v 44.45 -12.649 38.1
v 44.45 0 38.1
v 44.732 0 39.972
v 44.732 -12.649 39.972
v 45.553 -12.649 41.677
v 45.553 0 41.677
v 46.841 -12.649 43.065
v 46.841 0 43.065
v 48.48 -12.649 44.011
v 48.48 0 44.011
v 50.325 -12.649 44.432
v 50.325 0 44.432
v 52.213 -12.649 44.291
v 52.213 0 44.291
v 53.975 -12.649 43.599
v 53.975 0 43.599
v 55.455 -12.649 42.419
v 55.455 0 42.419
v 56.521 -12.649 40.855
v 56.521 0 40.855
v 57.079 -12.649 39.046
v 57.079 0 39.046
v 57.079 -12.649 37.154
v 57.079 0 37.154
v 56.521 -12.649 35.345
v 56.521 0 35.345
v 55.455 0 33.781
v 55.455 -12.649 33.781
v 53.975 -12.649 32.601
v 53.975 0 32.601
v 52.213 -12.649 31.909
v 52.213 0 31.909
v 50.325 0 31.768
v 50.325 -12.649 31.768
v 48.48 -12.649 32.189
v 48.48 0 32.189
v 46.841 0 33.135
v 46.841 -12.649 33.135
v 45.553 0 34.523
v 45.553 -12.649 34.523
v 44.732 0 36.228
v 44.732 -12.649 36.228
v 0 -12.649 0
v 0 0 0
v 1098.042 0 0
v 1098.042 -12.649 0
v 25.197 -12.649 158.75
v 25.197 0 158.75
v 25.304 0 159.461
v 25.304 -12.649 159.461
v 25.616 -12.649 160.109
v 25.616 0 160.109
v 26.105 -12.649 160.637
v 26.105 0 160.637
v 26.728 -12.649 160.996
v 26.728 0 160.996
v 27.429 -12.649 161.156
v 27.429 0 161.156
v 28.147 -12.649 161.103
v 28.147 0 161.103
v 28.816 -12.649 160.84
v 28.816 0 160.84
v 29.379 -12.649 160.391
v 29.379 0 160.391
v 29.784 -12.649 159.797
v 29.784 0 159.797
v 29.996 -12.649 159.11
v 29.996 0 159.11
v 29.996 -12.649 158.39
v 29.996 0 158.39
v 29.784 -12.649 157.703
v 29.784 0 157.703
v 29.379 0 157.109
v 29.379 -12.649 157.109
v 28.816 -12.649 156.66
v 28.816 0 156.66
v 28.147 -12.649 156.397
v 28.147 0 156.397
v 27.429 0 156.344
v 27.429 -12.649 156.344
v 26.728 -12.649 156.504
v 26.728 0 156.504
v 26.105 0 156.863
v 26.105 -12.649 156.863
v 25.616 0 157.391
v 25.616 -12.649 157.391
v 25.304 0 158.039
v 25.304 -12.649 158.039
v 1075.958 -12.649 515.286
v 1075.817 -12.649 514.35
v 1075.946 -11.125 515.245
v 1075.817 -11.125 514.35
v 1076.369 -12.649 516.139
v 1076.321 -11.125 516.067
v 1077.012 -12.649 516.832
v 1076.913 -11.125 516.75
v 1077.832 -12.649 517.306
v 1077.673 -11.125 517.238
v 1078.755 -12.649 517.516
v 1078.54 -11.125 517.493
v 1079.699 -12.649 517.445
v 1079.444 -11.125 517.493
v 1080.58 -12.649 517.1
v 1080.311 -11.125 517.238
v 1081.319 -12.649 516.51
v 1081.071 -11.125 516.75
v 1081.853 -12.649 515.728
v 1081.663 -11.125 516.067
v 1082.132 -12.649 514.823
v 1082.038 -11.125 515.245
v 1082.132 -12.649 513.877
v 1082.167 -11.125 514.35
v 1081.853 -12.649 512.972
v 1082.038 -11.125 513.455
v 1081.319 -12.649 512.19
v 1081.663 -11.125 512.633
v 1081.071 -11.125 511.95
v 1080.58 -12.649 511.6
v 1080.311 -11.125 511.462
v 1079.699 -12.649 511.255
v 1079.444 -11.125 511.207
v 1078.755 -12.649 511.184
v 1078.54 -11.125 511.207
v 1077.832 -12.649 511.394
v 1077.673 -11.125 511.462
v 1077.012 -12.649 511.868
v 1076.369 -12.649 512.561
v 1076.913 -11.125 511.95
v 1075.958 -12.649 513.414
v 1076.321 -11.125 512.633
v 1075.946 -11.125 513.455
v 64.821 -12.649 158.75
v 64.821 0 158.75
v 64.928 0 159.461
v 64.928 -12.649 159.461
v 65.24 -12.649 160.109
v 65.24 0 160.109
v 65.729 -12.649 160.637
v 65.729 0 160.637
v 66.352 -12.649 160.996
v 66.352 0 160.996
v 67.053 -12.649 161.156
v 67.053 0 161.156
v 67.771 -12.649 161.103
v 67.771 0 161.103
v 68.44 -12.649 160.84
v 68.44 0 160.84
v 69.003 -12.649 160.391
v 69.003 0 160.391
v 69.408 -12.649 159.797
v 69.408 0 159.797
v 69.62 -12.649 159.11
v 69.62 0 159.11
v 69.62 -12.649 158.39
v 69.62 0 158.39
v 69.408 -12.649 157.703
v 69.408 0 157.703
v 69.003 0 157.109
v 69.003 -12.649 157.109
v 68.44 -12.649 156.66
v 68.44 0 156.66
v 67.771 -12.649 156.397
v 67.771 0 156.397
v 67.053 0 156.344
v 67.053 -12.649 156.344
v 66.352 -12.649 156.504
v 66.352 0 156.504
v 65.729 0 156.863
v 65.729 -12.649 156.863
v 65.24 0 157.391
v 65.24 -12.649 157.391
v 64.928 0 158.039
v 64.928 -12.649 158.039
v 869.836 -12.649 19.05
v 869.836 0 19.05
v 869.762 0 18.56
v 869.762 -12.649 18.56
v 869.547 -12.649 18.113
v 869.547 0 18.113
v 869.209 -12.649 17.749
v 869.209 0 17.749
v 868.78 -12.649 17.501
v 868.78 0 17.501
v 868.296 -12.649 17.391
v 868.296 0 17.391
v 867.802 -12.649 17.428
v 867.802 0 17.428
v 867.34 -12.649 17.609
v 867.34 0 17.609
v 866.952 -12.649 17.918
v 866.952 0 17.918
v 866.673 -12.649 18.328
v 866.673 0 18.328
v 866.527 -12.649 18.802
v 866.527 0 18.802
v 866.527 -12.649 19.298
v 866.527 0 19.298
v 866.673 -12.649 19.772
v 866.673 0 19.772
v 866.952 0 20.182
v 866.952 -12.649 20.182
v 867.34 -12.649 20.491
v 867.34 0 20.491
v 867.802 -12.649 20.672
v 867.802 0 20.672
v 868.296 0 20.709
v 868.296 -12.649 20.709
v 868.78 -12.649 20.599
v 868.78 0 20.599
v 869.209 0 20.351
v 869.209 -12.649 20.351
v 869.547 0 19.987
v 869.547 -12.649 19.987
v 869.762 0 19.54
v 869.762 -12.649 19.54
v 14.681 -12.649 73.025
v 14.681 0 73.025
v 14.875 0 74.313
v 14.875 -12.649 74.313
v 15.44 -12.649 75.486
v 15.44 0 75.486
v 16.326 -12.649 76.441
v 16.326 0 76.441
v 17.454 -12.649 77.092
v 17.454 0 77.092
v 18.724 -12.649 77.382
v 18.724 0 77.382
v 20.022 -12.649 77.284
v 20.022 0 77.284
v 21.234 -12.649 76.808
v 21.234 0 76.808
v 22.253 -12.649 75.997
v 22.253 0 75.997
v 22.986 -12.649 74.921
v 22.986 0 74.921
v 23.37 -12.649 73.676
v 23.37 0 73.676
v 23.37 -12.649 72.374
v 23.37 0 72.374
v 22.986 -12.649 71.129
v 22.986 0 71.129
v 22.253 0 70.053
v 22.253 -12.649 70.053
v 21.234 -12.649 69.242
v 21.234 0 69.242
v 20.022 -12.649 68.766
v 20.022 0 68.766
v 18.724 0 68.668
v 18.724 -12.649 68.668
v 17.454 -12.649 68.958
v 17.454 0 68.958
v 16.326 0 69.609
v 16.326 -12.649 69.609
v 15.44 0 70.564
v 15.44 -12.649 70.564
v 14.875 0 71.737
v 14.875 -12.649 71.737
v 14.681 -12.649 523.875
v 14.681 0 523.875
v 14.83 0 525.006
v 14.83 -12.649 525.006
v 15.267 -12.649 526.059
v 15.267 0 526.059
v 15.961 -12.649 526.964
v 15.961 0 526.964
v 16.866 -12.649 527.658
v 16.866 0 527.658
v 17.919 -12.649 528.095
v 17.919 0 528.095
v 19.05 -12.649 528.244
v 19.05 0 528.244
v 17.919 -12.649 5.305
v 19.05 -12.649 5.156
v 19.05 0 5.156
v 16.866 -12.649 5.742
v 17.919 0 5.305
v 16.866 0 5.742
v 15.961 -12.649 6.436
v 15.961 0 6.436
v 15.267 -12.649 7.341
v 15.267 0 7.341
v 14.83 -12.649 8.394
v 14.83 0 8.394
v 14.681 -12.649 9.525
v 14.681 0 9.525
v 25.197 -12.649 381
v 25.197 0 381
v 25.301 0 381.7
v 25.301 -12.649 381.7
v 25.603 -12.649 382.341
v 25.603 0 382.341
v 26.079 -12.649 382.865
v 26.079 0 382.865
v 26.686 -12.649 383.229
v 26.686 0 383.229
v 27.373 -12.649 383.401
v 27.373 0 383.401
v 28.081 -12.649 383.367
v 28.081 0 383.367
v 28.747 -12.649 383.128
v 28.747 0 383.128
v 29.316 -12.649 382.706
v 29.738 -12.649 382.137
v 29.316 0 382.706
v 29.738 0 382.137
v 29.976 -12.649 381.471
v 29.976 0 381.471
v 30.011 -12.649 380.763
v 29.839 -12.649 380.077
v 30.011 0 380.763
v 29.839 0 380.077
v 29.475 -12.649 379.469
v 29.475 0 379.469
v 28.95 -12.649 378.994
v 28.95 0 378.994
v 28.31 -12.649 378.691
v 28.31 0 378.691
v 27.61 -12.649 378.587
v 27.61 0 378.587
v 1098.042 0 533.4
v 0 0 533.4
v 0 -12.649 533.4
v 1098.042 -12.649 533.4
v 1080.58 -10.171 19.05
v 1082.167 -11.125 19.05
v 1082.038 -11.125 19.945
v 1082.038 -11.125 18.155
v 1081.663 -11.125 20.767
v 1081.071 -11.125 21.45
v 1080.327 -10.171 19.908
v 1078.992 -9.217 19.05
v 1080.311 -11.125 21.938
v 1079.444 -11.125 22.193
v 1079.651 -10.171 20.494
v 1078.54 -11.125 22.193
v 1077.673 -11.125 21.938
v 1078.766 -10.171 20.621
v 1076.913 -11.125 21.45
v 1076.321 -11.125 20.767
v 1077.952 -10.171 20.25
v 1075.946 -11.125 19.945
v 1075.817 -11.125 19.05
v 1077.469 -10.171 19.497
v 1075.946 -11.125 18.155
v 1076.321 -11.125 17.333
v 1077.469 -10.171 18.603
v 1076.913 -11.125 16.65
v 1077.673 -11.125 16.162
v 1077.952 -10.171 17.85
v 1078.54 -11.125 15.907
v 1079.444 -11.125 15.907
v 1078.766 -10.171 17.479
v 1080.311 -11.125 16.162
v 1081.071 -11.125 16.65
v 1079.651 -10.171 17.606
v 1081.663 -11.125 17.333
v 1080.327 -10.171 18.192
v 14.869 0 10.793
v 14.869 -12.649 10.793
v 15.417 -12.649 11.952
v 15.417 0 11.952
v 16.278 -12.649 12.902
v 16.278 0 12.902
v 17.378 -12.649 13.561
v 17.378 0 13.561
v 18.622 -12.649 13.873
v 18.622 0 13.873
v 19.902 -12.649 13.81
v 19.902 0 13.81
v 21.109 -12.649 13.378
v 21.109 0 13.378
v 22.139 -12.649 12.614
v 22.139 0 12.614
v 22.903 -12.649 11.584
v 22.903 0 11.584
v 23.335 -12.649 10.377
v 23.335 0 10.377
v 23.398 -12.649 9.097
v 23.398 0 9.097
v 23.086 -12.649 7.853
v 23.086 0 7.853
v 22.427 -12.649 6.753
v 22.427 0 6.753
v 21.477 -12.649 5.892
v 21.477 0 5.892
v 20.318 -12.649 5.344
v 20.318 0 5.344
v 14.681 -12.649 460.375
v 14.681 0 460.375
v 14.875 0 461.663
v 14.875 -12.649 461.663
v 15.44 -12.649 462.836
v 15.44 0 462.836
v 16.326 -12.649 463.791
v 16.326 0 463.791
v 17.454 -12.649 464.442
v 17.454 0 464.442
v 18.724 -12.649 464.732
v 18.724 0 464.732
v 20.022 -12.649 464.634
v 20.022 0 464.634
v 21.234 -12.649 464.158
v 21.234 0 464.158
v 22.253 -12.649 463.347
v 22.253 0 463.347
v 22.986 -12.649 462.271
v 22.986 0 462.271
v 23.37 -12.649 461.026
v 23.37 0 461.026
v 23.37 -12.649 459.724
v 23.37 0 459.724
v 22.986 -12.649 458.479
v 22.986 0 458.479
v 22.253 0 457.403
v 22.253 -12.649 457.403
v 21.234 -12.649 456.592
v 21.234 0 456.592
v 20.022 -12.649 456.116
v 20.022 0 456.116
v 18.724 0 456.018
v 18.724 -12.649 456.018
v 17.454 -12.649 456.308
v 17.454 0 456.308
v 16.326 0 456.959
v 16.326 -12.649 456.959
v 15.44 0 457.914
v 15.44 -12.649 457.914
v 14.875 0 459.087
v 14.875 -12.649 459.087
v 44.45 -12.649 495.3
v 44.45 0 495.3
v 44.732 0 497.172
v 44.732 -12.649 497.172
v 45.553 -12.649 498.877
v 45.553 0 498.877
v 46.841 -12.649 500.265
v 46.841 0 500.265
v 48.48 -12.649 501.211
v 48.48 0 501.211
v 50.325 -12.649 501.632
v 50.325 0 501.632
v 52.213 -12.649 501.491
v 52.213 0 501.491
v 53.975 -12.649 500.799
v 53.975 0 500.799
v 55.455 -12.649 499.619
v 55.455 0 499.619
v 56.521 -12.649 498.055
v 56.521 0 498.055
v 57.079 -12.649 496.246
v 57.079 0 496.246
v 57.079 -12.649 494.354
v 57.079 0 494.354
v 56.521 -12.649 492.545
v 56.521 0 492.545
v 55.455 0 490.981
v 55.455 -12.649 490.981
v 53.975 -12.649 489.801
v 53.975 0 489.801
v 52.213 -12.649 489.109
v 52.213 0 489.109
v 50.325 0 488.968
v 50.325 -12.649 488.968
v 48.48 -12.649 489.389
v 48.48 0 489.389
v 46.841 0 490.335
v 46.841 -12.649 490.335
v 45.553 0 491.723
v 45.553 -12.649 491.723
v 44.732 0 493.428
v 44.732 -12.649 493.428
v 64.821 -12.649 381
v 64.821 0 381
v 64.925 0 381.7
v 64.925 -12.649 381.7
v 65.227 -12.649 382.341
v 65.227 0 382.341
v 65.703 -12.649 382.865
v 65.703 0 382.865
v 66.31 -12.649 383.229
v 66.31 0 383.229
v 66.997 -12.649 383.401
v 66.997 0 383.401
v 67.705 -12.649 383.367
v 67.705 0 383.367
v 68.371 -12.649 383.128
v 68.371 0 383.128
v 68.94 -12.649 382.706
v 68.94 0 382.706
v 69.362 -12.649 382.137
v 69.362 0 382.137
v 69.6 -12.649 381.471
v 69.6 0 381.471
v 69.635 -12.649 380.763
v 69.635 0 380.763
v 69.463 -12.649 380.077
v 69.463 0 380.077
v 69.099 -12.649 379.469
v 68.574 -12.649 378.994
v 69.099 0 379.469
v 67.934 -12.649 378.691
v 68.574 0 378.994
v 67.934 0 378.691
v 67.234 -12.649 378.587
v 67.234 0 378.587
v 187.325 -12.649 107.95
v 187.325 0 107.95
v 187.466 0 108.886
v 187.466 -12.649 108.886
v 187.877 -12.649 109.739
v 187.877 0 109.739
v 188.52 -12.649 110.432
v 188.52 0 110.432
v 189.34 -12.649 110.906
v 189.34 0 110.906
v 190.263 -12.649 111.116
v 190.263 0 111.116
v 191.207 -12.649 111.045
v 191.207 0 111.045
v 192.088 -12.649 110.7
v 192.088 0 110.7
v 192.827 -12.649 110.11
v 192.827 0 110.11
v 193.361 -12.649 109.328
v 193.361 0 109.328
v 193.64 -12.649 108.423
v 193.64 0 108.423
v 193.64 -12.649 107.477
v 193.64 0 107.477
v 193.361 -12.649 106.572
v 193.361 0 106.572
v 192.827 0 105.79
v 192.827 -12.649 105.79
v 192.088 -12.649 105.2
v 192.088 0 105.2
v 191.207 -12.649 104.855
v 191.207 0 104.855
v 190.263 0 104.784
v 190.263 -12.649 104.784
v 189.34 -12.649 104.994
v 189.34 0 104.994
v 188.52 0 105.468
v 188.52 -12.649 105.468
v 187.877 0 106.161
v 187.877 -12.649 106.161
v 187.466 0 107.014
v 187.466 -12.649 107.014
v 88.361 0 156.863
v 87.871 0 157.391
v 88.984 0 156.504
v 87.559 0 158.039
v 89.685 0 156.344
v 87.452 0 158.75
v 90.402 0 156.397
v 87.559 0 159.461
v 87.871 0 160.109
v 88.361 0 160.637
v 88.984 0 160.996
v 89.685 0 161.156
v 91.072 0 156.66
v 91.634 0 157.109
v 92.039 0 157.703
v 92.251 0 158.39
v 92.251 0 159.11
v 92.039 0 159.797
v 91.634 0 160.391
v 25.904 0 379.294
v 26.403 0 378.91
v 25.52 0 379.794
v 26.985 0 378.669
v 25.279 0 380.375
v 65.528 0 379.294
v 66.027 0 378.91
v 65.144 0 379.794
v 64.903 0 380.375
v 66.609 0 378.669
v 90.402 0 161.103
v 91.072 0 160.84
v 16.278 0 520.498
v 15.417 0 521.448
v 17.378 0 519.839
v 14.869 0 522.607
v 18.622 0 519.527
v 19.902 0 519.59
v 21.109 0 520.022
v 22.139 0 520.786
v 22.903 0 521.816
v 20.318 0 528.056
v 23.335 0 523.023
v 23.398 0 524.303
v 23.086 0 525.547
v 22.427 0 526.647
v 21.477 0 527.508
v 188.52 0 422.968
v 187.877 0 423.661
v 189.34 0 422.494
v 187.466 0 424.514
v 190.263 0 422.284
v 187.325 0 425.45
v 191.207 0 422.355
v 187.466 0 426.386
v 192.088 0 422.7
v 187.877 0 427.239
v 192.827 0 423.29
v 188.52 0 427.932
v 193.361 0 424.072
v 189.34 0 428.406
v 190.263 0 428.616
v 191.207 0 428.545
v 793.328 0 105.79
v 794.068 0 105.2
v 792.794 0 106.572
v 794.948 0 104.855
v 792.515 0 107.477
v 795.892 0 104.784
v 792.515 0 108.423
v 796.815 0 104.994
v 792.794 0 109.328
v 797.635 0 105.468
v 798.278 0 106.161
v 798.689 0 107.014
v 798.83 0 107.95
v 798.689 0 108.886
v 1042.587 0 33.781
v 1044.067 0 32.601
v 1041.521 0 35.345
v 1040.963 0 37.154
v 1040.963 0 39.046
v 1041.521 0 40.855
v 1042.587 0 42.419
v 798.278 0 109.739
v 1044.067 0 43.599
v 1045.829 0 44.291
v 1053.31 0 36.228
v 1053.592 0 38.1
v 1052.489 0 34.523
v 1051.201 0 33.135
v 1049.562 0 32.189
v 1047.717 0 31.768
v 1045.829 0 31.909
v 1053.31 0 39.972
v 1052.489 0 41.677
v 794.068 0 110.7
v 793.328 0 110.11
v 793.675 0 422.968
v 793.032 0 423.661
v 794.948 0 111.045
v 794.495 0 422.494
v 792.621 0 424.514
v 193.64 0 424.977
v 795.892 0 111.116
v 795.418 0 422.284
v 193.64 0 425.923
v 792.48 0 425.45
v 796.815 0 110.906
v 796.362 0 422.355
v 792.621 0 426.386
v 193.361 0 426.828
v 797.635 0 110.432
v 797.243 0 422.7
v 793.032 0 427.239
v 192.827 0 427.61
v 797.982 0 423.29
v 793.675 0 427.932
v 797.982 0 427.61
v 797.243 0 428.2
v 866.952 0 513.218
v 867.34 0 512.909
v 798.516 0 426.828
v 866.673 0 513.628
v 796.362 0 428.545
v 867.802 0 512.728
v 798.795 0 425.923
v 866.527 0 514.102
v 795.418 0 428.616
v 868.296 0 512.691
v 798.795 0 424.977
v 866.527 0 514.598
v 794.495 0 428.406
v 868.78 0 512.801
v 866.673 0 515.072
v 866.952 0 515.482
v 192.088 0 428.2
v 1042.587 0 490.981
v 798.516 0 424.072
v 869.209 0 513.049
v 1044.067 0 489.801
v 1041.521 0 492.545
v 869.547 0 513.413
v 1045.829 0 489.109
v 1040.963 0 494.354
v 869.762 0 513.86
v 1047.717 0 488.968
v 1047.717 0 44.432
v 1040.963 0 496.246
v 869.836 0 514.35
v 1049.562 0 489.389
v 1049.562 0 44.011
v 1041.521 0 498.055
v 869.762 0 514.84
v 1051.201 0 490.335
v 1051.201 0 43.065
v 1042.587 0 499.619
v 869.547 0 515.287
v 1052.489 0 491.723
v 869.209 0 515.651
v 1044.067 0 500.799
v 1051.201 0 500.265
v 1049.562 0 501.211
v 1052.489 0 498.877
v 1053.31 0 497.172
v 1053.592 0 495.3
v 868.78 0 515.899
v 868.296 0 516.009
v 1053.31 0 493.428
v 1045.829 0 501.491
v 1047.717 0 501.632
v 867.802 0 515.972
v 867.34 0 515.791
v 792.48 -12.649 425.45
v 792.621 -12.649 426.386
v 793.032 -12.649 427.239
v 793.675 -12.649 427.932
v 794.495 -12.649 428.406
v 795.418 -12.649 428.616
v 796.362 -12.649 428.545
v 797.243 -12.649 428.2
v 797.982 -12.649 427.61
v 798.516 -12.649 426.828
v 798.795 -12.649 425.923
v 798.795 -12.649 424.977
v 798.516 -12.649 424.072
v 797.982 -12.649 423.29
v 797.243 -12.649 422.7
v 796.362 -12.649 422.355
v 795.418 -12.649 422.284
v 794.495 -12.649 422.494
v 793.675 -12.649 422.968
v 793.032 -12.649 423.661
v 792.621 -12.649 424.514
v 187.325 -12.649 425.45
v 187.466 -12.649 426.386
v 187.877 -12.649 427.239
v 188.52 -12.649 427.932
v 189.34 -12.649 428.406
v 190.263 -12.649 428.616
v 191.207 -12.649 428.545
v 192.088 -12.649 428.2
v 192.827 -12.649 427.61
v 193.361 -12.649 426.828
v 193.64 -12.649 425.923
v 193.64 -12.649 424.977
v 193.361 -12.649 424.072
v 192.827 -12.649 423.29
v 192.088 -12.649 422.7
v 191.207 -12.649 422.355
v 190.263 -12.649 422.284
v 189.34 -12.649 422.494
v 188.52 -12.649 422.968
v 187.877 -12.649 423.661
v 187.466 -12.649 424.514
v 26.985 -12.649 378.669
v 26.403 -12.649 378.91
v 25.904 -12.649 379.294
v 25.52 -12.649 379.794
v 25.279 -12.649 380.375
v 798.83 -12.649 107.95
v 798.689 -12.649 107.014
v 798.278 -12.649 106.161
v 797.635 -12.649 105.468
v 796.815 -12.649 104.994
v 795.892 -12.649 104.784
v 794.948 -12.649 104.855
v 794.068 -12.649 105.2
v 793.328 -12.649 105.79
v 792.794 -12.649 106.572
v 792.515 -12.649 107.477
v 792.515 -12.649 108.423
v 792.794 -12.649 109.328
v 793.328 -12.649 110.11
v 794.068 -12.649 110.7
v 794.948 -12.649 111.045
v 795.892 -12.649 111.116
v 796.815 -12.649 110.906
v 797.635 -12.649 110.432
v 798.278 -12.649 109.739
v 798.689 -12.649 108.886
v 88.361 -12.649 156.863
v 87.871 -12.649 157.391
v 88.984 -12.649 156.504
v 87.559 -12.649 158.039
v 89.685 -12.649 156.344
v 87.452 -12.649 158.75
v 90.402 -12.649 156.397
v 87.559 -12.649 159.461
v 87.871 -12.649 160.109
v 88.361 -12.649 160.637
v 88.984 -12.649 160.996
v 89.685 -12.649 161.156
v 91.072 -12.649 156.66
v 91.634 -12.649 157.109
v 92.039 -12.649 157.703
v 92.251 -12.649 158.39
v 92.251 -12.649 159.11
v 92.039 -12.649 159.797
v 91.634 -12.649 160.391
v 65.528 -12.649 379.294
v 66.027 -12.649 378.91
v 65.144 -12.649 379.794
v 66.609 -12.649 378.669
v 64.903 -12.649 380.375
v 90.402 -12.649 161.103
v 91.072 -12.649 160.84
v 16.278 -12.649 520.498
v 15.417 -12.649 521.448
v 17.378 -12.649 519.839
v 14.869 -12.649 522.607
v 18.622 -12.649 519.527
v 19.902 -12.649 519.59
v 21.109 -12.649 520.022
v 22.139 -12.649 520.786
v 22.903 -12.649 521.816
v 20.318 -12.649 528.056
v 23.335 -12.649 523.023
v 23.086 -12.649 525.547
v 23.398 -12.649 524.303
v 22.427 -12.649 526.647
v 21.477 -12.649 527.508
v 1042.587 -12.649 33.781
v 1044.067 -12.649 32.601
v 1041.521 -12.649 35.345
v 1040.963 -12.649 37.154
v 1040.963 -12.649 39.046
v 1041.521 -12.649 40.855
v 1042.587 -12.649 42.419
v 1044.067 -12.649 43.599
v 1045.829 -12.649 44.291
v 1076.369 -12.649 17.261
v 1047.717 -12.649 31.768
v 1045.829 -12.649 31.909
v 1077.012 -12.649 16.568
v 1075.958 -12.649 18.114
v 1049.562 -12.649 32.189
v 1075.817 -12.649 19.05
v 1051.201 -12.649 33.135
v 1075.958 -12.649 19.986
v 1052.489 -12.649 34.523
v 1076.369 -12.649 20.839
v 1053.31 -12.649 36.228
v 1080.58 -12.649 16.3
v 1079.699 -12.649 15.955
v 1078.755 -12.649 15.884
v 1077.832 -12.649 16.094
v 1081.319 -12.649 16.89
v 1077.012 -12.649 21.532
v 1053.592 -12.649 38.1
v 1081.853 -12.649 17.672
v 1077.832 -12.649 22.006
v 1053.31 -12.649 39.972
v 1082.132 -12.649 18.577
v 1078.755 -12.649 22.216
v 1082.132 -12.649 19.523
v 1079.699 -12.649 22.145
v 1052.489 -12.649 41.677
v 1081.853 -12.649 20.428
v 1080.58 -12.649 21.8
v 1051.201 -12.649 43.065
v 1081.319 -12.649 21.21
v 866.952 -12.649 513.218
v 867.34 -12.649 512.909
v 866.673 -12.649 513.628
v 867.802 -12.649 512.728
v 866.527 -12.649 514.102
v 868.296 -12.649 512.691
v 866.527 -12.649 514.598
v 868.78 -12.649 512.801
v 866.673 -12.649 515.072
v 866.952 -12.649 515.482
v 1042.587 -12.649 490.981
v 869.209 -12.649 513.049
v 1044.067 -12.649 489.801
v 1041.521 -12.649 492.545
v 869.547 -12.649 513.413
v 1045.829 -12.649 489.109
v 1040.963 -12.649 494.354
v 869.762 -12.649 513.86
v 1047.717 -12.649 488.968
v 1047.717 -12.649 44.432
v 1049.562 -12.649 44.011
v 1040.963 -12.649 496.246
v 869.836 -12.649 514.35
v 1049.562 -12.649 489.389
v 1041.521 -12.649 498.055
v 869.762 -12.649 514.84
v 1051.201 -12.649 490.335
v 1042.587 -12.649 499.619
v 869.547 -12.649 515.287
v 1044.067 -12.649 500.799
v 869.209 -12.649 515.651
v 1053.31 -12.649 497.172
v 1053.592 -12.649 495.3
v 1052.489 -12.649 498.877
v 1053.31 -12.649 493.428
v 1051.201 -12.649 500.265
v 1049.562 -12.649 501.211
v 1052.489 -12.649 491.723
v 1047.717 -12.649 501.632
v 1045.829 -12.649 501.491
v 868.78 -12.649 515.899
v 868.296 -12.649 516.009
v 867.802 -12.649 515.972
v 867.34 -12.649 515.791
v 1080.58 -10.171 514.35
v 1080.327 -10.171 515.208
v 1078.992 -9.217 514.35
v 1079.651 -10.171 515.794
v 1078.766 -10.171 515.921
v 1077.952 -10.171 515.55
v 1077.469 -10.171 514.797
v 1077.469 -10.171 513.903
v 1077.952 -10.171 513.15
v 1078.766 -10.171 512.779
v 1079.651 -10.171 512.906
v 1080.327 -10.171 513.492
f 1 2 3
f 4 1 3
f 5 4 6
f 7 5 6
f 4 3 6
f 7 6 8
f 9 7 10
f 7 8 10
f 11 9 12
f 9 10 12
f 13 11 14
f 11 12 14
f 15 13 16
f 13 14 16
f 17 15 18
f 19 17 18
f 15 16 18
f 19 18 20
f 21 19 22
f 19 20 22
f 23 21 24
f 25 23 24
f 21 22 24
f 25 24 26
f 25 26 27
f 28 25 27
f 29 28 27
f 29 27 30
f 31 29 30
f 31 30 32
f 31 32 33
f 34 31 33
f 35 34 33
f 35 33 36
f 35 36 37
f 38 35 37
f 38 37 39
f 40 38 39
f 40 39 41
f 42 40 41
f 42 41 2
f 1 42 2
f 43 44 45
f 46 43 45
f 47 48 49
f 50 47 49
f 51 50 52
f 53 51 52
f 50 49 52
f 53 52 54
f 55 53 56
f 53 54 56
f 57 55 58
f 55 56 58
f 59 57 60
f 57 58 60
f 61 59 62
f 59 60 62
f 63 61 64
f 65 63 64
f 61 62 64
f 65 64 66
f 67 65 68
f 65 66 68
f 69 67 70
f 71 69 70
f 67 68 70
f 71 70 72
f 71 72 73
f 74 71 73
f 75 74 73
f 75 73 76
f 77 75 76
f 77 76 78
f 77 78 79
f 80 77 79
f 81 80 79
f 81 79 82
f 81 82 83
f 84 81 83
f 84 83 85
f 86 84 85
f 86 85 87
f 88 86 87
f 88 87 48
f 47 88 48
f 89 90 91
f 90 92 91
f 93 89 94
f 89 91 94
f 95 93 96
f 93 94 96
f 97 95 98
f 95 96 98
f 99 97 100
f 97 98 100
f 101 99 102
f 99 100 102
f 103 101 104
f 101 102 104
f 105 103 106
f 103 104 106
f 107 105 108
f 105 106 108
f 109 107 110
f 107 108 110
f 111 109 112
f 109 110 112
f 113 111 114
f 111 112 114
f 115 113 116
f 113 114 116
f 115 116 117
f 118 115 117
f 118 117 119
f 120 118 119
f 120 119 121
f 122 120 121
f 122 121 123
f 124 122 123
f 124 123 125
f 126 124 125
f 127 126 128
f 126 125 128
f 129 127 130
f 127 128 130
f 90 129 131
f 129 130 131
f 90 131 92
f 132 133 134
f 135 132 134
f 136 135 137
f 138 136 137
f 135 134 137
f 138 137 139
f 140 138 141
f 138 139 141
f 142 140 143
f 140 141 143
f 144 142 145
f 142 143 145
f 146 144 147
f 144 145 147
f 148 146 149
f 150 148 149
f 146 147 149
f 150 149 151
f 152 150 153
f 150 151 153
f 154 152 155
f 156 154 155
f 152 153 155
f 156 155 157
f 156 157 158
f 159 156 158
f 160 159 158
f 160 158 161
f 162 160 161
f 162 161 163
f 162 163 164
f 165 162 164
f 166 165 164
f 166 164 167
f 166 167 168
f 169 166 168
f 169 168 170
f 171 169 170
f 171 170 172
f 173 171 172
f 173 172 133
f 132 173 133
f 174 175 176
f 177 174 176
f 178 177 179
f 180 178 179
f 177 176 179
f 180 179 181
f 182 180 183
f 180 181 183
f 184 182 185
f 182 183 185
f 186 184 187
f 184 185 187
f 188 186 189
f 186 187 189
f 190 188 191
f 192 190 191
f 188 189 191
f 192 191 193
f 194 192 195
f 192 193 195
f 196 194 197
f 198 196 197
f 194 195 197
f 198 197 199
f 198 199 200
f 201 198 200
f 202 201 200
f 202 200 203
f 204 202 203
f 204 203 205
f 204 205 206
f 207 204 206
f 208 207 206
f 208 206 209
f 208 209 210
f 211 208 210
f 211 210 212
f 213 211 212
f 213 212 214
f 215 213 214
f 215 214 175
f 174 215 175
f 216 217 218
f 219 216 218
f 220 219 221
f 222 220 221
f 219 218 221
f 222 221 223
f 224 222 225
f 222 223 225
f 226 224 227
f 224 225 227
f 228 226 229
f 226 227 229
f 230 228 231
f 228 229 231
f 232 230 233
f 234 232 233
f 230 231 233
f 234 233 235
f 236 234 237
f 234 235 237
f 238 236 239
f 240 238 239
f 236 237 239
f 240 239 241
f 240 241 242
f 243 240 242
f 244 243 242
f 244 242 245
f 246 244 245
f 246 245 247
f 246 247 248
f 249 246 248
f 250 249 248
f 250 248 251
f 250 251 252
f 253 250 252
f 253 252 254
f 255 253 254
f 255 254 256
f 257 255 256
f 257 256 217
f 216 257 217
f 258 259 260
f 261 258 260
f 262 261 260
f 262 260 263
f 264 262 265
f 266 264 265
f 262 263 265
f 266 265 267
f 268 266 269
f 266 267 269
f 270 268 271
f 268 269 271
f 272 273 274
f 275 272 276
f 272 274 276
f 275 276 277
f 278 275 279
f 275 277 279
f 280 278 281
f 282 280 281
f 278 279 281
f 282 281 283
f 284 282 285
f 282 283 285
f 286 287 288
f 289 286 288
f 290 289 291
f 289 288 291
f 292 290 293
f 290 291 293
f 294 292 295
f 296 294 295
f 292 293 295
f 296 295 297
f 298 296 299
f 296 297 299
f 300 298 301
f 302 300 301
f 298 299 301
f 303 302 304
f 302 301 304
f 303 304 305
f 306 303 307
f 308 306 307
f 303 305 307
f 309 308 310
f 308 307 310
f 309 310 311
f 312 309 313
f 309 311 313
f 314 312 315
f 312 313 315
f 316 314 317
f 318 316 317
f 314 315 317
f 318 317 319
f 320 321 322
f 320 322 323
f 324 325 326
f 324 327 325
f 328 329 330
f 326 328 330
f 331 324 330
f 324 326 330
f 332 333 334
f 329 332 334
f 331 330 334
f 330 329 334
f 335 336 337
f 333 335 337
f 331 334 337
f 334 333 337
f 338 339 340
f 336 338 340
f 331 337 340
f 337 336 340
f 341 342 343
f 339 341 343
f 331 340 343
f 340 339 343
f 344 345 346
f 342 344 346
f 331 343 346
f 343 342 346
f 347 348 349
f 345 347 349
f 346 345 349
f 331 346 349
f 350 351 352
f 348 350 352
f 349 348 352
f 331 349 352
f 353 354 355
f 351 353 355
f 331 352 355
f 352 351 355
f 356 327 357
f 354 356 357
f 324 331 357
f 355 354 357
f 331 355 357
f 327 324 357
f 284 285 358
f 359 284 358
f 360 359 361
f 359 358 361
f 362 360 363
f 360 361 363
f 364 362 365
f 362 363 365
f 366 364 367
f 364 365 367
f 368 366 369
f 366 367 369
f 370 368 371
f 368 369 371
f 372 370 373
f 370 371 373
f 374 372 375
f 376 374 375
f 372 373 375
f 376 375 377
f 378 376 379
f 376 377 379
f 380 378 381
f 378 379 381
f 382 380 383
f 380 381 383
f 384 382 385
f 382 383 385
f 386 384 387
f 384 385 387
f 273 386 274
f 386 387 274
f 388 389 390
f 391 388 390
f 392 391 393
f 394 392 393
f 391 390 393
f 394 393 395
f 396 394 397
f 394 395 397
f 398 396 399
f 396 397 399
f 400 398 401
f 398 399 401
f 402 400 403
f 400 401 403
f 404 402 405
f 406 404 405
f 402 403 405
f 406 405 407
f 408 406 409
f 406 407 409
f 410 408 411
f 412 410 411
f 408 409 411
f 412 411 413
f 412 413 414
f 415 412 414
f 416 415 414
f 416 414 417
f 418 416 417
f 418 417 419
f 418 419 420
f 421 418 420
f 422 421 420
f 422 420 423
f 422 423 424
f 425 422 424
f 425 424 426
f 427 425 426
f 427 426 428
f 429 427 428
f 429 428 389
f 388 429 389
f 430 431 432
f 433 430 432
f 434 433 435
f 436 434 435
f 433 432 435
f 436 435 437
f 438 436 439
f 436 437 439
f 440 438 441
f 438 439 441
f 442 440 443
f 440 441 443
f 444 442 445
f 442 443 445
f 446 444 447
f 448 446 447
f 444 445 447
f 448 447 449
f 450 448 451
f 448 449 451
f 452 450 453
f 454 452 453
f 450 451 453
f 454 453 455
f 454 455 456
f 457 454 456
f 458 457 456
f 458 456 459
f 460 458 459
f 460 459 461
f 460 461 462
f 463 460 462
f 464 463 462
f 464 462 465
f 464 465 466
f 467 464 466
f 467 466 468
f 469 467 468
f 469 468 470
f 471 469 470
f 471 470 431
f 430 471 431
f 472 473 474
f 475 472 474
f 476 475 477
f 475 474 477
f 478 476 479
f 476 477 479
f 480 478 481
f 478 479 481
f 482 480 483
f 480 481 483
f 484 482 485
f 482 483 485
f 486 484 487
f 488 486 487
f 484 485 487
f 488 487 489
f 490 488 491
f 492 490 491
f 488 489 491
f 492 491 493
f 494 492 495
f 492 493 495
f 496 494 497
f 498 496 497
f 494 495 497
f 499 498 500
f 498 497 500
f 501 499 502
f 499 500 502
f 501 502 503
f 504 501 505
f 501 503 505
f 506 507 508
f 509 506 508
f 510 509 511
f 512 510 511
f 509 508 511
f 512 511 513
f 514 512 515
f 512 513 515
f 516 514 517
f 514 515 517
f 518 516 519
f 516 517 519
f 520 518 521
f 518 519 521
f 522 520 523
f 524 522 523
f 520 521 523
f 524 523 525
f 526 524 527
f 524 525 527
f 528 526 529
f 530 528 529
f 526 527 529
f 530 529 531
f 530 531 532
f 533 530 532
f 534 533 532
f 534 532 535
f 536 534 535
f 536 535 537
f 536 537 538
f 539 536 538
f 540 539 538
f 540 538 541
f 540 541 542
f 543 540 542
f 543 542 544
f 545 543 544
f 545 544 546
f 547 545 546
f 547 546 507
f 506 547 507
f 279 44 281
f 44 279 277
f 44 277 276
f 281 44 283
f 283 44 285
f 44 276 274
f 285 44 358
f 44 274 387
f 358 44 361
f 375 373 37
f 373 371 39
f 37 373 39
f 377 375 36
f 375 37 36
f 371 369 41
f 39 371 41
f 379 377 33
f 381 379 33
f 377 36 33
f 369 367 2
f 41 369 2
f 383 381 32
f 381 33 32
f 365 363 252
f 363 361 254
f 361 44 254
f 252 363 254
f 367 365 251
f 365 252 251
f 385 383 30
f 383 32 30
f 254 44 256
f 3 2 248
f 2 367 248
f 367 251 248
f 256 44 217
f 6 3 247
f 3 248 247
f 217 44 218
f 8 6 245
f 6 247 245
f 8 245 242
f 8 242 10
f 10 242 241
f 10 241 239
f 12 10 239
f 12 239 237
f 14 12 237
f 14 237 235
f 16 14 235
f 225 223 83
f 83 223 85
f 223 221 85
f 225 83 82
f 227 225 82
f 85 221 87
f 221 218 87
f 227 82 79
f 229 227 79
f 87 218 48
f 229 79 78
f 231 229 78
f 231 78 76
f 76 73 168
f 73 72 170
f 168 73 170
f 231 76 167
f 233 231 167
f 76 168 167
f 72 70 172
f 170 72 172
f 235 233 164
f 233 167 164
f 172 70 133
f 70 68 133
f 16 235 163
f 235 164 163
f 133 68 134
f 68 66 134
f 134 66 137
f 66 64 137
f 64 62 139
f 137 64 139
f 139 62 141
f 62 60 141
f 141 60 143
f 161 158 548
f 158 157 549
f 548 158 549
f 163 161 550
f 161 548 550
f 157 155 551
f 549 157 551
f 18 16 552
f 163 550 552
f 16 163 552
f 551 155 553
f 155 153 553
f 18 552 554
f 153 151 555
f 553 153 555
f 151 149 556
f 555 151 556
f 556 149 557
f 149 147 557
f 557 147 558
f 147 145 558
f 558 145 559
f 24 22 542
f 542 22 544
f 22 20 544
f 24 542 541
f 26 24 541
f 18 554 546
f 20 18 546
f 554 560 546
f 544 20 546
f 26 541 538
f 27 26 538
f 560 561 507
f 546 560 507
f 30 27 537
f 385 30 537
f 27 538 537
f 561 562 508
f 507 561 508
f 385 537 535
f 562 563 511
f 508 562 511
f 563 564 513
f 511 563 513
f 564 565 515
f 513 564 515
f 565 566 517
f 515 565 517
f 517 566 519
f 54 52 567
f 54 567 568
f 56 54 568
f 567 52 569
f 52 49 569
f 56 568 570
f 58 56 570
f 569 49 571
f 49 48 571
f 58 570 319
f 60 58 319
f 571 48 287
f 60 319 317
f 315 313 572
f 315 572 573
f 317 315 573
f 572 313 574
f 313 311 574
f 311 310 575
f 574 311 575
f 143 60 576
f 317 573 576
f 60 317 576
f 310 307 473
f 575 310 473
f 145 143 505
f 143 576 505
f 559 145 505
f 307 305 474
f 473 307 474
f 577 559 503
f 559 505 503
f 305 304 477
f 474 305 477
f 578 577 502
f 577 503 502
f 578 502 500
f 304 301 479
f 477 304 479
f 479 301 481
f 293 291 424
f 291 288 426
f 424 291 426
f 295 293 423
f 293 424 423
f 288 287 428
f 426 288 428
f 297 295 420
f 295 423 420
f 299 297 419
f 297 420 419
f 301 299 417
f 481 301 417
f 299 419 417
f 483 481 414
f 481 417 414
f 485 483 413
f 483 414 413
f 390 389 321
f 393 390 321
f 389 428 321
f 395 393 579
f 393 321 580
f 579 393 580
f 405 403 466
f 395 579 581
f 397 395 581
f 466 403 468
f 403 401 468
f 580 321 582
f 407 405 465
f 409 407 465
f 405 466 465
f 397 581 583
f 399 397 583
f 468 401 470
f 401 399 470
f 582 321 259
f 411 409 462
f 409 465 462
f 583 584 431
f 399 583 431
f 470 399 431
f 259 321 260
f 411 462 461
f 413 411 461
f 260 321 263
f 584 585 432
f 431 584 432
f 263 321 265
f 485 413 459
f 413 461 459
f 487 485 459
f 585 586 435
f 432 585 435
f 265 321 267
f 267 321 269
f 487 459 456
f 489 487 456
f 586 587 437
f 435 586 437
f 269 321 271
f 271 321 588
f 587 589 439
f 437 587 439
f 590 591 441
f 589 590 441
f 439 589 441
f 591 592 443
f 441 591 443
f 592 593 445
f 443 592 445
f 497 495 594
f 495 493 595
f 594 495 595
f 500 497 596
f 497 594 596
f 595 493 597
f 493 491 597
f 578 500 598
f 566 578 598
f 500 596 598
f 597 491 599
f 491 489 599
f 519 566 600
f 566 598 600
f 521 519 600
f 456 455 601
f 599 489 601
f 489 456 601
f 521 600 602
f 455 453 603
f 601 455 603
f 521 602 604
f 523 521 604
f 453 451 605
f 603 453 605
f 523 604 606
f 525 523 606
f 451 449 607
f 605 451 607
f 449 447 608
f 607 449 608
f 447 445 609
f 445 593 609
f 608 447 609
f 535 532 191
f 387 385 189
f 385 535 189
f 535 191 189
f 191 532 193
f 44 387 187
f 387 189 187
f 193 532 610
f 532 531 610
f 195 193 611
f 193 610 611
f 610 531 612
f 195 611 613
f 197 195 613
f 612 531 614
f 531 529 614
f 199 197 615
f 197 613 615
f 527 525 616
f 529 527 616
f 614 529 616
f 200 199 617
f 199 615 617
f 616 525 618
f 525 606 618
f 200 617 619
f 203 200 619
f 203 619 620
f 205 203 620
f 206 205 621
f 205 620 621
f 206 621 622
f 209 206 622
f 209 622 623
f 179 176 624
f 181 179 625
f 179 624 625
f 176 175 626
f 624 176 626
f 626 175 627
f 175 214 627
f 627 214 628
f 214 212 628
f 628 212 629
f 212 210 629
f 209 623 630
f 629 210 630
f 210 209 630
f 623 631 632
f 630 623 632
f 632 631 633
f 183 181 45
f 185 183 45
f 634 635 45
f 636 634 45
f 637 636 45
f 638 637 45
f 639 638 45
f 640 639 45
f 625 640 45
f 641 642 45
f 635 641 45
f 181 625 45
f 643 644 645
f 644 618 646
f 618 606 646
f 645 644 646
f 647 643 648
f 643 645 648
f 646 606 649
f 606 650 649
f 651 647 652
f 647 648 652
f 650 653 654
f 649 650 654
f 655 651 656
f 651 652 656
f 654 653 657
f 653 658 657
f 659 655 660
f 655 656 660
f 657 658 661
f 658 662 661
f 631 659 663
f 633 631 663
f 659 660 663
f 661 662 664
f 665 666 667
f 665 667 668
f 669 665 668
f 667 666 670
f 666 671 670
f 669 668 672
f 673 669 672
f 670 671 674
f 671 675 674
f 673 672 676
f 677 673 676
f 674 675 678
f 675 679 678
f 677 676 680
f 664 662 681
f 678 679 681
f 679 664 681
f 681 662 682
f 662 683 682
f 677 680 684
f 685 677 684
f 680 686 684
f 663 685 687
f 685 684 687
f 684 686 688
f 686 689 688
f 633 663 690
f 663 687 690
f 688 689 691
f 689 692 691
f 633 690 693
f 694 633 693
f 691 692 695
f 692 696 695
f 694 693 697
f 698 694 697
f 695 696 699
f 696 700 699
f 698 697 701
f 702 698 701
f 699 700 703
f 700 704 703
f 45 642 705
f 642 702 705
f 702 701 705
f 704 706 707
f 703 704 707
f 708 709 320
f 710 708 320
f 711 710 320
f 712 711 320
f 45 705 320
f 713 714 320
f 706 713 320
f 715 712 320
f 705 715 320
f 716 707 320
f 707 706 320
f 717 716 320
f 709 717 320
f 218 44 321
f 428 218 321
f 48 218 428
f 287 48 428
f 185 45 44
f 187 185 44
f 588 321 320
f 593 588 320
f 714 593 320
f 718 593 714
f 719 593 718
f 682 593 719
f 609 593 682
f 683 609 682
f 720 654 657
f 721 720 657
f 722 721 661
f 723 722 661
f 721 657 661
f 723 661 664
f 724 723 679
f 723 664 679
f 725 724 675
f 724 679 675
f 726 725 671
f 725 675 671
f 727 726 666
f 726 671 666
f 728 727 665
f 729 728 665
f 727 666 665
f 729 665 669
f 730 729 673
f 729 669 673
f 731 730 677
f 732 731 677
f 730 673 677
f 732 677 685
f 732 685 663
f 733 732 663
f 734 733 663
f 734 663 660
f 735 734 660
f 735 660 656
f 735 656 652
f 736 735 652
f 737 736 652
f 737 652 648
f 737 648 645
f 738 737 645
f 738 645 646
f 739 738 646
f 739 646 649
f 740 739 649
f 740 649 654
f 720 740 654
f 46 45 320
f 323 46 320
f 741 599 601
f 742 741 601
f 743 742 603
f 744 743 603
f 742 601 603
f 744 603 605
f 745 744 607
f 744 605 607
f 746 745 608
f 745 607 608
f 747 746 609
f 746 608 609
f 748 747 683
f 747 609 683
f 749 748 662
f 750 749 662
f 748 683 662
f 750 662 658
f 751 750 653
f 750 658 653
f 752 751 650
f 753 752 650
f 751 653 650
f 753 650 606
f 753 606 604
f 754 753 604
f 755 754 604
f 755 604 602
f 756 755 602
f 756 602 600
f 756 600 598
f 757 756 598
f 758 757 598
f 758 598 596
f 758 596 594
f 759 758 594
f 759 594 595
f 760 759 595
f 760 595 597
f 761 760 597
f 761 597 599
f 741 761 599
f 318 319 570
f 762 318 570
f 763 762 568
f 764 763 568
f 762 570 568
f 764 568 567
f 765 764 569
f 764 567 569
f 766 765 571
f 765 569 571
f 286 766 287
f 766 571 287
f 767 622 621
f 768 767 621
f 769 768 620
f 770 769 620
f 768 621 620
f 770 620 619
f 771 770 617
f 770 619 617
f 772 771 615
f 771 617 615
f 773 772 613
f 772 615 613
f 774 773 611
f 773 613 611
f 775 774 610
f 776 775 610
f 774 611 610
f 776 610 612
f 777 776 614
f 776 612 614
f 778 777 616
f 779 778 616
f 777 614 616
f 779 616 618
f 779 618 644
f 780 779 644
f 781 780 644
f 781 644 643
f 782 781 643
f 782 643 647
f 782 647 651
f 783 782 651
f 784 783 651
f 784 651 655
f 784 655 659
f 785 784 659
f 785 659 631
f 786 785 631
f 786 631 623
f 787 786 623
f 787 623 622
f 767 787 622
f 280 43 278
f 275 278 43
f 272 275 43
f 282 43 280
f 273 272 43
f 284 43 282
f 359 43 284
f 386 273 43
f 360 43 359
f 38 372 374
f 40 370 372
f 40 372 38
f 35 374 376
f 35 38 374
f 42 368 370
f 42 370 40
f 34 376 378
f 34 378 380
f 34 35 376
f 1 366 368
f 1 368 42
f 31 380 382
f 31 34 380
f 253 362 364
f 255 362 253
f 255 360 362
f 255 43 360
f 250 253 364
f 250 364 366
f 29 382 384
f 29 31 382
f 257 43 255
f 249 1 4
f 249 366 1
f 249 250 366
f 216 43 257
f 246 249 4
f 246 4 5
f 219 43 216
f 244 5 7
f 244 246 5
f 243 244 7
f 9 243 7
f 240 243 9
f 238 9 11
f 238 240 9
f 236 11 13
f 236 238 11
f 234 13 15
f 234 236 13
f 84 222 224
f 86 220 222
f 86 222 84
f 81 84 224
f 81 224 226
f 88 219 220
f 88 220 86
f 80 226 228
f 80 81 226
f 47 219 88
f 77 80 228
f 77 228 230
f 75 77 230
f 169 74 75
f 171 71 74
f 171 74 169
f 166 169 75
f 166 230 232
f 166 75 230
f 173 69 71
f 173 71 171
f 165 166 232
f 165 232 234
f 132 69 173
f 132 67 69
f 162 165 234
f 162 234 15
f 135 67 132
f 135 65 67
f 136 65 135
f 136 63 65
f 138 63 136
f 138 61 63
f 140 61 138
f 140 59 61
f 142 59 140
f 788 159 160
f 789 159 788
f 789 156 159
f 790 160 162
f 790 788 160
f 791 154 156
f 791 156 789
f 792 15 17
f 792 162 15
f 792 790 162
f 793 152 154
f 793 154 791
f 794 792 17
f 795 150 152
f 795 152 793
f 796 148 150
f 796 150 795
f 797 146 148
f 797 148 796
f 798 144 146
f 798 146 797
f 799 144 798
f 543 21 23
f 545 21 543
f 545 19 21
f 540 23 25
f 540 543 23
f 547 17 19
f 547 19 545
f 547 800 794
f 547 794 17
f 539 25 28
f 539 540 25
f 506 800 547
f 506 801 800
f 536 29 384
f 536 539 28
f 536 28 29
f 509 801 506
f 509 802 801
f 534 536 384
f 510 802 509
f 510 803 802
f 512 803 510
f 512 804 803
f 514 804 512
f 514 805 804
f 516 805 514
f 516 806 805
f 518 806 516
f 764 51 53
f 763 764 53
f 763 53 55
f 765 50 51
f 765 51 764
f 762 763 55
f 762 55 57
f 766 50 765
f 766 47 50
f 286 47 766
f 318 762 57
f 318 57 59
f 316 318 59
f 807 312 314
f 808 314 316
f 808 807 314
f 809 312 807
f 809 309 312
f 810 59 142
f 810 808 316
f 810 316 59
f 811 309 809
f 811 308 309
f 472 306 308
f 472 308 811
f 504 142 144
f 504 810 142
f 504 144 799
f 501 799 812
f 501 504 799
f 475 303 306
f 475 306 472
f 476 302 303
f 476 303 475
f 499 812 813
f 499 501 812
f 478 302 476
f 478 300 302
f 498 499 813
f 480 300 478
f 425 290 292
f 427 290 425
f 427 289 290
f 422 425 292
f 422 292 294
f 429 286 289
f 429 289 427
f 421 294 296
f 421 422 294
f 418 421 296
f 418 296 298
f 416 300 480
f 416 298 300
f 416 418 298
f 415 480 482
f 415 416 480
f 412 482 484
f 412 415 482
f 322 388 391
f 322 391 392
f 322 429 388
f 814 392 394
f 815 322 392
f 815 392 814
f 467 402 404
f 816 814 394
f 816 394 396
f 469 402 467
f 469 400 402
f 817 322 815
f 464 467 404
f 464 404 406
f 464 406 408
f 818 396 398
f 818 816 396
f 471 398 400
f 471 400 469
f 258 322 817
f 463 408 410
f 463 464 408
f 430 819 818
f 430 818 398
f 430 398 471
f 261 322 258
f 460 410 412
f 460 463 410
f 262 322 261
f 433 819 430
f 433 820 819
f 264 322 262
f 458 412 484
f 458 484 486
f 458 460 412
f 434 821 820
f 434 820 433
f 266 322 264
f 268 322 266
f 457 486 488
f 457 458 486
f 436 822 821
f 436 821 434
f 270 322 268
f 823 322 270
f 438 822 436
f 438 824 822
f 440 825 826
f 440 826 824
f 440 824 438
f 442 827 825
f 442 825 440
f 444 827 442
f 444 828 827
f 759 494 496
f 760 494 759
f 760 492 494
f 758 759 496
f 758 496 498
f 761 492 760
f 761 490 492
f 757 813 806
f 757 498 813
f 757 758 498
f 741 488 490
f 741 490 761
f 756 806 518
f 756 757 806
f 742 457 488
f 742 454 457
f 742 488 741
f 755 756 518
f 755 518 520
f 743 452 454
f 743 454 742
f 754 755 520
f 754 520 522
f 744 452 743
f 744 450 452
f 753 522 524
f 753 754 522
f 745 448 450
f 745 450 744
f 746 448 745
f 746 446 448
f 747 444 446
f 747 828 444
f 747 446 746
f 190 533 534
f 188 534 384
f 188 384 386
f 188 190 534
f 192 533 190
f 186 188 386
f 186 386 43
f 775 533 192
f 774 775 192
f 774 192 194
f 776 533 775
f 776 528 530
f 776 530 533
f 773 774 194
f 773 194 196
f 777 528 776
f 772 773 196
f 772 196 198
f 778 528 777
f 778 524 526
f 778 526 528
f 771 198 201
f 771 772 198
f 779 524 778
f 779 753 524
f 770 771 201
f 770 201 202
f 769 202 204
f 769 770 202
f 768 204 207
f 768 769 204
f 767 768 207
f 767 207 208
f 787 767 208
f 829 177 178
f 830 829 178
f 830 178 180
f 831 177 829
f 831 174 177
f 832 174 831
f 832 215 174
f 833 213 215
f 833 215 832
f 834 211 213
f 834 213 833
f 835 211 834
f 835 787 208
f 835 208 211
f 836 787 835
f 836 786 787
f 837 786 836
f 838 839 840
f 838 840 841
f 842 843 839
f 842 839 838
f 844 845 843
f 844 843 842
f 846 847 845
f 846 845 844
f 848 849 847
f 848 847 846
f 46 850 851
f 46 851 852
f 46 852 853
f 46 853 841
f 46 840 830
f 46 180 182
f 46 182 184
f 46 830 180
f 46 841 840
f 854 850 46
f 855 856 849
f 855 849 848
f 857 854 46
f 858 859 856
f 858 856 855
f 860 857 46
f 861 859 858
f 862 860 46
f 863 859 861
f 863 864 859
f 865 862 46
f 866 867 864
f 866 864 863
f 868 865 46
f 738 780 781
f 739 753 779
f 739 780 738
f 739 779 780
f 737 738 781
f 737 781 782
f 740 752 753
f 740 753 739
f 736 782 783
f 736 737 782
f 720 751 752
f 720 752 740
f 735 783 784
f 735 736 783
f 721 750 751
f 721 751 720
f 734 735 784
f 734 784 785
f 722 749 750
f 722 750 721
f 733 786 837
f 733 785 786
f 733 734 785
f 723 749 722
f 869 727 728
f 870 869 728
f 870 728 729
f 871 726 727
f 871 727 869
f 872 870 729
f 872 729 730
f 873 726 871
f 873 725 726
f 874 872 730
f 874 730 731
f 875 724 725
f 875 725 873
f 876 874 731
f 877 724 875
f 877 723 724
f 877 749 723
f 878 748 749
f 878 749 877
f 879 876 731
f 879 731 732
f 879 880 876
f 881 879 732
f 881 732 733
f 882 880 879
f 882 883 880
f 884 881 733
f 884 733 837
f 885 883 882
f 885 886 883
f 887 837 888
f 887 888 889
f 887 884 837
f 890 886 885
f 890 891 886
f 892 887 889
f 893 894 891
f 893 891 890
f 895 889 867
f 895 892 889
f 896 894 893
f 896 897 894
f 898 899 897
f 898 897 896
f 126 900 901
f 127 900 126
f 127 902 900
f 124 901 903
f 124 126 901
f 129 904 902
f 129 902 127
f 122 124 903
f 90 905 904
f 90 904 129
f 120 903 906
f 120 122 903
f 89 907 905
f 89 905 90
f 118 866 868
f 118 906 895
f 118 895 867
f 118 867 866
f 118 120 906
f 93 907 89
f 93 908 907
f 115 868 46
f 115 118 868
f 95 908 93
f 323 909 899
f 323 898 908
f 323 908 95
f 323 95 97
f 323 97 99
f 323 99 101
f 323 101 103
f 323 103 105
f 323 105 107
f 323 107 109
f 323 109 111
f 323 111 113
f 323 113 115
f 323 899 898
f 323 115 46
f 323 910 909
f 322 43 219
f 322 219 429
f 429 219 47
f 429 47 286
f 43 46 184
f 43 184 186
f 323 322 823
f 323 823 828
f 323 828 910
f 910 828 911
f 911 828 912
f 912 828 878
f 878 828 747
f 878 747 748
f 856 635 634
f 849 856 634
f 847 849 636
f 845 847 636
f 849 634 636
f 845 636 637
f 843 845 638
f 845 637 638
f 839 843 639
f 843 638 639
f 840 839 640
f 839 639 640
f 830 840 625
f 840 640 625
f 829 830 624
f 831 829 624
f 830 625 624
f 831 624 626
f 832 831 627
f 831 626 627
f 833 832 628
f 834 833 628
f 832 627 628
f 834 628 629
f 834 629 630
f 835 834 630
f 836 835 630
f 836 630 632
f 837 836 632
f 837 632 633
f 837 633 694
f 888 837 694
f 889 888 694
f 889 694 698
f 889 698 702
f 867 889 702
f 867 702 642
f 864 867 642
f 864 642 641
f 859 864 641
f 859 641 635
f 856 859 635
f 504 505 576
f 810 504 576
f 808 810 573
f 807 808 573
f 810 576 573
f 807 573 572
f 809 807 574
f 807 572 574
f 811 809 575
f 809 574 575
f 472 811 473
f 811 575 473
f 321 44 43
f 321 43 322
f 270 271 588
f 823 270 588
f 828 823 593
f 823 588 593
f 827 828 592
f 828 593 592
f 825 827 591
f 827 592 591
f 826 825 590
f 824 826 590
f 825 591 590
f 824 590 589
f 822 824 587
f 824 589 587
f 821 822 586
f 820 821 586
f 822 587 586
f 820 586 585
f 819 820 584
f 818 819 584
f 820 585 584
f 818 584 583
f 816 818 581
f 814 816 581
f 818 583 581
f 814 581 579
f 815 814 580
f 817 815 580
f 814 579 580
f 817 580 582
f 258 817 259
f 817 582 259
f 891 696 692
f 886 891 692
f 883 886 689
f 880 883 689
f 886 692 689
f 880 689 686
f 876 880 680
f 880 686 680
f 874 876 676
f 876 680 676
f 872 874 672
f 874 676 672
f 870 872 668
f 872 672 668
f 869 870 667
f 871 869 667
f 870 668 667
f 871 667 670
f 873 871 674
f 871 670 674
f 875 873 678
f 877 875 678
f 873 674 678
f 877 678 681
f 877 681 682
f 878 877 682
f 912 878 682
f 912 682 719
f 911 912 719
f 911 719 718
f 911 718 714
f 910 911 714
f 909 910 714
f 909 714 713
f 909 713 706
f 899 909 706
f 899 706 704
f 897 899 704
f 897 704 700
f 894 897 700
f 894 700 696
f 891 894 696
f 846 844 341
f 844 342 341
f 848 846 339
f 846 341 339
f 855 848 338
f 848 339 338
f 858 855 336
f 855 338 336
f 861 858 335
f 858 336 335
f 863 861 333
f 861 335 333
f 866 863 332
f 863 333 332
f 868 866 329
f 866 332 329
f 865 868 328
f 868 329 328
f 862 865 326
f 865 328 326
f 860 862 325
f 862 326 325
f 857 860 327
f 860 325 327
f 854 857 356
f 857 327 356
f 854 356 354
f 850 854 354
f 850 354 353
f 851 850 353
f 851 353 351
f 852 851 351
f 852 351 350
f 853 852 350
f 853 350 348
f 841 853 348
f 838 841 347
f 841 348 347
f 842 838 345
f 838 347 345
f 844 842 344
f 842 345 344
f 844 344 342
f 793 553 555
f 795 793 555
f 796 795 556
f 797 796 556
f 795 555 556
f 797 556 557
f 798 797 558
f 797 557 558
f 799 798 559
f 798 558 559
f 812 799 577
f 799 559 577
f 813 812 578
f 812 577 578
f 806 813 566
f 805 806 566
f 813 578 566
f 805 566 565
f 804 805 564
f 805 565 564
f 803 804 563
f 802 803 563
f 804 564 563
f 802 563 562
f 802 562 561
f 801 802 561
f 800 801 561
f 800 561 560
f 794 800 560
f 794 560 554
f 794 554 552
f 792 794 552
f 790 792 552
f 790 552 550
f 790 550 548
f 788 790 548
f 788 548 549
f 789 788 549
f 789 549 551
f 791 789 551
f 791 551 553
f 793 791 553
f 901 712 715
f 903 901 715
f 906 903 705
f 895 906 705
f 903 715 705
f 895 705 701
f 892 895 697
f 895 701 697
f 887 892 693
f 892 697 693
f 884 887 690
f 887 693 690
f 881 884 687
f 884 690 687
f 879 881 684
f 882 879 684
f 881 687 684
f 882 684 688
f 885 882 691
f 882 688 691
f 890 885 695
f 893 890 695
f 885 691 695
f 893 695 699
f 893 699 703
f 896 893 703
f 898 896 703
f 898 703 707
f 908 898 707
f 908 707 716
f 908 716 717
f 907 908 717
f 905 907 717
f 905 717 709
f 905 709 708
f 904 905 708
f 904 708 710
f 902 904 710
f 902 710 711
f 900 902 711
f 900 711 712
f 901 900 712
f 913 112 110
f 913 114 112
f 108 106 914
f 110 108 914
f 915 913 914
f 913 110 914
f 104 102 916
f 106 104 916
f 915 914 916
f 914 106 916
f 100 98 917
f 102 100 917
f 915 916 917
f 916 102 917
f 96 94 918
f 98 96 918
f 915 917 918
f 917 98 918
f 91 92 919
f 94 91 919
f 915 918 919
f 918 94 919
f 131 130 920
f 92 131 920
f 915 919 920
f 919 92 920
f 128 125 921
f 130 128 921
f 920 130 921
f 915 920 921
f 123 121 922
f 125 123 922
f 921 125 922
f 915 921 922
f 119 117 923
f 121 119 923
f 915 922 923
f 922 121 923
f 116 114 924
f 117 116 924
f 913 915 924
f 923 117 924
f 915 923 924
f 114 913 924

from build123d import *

# Parameters (mm, degrees)
F0_W     = 1098.042
F0_H     = 533.4
F1_DEPTH = 12.6492
F3_D     = 6.35
F3_DEPTH = 1.524
F3_TIP   = 1.9077324654
F4_R     = 6.35
F4_R_2   = 3.175
F4_R_3   = 2.413
F4_R_4   = 4.3688
F5_DEPTH = 25.4


with BuildPart() as f1:
    # F0 (on Front) → F1 (new body)
    with BuildSketch(Plane.XZ):
        with Locations((549.021, 266.7)):
            Rectangle(F0_W, F0_H)
    extrude(amount=F1_DEPTH)

    # F3
    with Locations(Plane.XZ.offset(12.6492)):
        with Locations((1078.992, 514.35), (1078.992, 19.05)):
            Hole(F3_D / 2, depth=F3_DEPTH)
            with Locations((0, 0, -(F3_DEPTH + F3_TIP / 2))):  # 118° drill point
                Cone(0, F3_D / 2, F3_TIP, mode=Mode.SUBTRACT)

    # F4 (on face) → F5 (cut)
    with BuildSketch(Plane(origin=(0, 0, 0), x_dir=(-1, 0, 0), z_dir=(0, 1, 0))):
        with BuildLine():
            ThreePointArc((-866.5083, 19.05), (-868.172, 20.7137), (-869.8357, 19.05))
            ThreePointArc((-869.8357, 19.05), (-868.172, 17.3863), (-866.5083, 19.05))
        make_face()
        with BuildLine():
            ThreePointArc((-792.48, 107.95), (-795.655, 111.125), (-798.83, 107.95))
            ThreePointArc((-798.83, 107.95), (-795.655, 104.775), (-792.48, 107.95))
        make_face()
        with BuildLine():
            ThreePointArc((-1040.892, 38.1), (-1047.242, 44.45), (-1053.592, 38.1))
            ThreePointArc((-1053.592, 38.1), (-1047.242, 31.75), (-1040.892, 38.1))
        make_face()
        with BuildLine():
            ThreePointArc((-866.5083, 514.35), (-868.172, 516.0137), (-869.8357, 514.35))
            ThreePointArc((-869.8357, 514.35), (-868.172, 512.6863), (-866.5083, 514.35))
        make_face()
        with BuildLine():
            ThreePointArc((-1040.892, 495.3), (-1047.242, 501.65), (-1053.592, 495.3))
            ThreePointArc((-1053.592, 495.3), (-1047.242, 488.95), (-1040.892, 495.3))
        make_face()
        with BuildLine():
            ThreePointArc((-798.83, 425.45), (-795.655, 422.275), (-792.48, 425.45))
            ThreePointArc((-792.48, 425.45), (-795.655, 428.625), (-798.83, 425.45))
        make_face()
        with Locations((-50.8, 38.1)):
            Circle(F4_R)
        with Locations((-190.5, 107.95)):
            Circle(F4_R_2)
        with Locations((-89.8652, 158.75)):
            Circle(F4_R_3)
        with BuildLine():
            ThreePointArc((-69.6468, 158.75), (-67.2338, 156.337), (-64.8208, 158.75))
            Line((-64.8208, 158.75), (-67.2338, 158.75))
            Line((-67.2338, 158.75), (-69.6468, 158.75))
        make_face()
        with BuildLine():
            Line((-67.2338, 158.75), (-64.8208, 158.75))
            ThreePointArc((-64.8208, 158.75), (-67.2338, 161.163), (-69.6468, 158.75))
            Line((-69.6468, 158.75), (-67.2338, 158.75))
        make_face()
        with BuildLine():
            ThreePointArc((-30.0228, 158.75), (-27.6098, 156.337), (-25.1968, 158.75))
            Line((-25.1968, 158.75), (-27.6098, 158.75))
            Line((-27.6098, 158.75), (-30.0228, 158.75))
        make_face()
        with BuildLine():
            Line((-27.6098, 158.75), (-25.1968, 158.75))
            ThreePointArc((-25.1968, 158.75), (-27.6098, 161.163), (-30.0228, 158.75))
            Line((-30.0228, 158.75), (-27.6098, 158.75))
        make_face()
        with BuildLine():
            ThreePointArc((-14.6812, 9.525), (-22.1392081056, 12.6142081056), (-19.05, 5.1562))
            ThreePointArc((-19.05, 5.1562), (-15.9607918944, 6.4357918944), (-14.6812, 9.525))
        make_face()
        with Locations((-50.8, 495.3)):
            Circle(F4_R)
        with BuildLine():
            ThreePointArc((-14.6812, 523.875), (-15.9607918944, 526.9642081056), (-19.05, 528.2438))
            ThreePointArc((-19.05, 528.2438), (-22.1392081056, 520.7857918944), (-14.6812, 523.875))
        make_face()
        with Locations((-190.5, 425.45)):
            Circle(F4_R_2)
        with Locations((-19.05, 460.375)):
            Circle(F4_R_4)
        with BuildLine():
            ThreePointArc((-67.2338, 378.587), (-65.527551337, 379.293751337), (-64.8208, 381))
            ThreePointArc((-64.8208, 381), (-68.940048663, 382.706248663), (-67.2338, 378.587))
        make_face()
        with BuildLine():
            ThreePointArc((-27.6098, 378.587), (-25.903551337, 379.293751337), (-25.1968, 381))
            ThreePointArc((-25.1968, 381), (-29.316048663, 382.706248663), (-27.6098, 378.587))
        make_face()
        with Locations((-19.05, 73.025)):
            Circle(F4_R_4)
    extrude(amount=-F5_DEPTH, mode=Mode.SUBTRACT)


solid = f1.part
